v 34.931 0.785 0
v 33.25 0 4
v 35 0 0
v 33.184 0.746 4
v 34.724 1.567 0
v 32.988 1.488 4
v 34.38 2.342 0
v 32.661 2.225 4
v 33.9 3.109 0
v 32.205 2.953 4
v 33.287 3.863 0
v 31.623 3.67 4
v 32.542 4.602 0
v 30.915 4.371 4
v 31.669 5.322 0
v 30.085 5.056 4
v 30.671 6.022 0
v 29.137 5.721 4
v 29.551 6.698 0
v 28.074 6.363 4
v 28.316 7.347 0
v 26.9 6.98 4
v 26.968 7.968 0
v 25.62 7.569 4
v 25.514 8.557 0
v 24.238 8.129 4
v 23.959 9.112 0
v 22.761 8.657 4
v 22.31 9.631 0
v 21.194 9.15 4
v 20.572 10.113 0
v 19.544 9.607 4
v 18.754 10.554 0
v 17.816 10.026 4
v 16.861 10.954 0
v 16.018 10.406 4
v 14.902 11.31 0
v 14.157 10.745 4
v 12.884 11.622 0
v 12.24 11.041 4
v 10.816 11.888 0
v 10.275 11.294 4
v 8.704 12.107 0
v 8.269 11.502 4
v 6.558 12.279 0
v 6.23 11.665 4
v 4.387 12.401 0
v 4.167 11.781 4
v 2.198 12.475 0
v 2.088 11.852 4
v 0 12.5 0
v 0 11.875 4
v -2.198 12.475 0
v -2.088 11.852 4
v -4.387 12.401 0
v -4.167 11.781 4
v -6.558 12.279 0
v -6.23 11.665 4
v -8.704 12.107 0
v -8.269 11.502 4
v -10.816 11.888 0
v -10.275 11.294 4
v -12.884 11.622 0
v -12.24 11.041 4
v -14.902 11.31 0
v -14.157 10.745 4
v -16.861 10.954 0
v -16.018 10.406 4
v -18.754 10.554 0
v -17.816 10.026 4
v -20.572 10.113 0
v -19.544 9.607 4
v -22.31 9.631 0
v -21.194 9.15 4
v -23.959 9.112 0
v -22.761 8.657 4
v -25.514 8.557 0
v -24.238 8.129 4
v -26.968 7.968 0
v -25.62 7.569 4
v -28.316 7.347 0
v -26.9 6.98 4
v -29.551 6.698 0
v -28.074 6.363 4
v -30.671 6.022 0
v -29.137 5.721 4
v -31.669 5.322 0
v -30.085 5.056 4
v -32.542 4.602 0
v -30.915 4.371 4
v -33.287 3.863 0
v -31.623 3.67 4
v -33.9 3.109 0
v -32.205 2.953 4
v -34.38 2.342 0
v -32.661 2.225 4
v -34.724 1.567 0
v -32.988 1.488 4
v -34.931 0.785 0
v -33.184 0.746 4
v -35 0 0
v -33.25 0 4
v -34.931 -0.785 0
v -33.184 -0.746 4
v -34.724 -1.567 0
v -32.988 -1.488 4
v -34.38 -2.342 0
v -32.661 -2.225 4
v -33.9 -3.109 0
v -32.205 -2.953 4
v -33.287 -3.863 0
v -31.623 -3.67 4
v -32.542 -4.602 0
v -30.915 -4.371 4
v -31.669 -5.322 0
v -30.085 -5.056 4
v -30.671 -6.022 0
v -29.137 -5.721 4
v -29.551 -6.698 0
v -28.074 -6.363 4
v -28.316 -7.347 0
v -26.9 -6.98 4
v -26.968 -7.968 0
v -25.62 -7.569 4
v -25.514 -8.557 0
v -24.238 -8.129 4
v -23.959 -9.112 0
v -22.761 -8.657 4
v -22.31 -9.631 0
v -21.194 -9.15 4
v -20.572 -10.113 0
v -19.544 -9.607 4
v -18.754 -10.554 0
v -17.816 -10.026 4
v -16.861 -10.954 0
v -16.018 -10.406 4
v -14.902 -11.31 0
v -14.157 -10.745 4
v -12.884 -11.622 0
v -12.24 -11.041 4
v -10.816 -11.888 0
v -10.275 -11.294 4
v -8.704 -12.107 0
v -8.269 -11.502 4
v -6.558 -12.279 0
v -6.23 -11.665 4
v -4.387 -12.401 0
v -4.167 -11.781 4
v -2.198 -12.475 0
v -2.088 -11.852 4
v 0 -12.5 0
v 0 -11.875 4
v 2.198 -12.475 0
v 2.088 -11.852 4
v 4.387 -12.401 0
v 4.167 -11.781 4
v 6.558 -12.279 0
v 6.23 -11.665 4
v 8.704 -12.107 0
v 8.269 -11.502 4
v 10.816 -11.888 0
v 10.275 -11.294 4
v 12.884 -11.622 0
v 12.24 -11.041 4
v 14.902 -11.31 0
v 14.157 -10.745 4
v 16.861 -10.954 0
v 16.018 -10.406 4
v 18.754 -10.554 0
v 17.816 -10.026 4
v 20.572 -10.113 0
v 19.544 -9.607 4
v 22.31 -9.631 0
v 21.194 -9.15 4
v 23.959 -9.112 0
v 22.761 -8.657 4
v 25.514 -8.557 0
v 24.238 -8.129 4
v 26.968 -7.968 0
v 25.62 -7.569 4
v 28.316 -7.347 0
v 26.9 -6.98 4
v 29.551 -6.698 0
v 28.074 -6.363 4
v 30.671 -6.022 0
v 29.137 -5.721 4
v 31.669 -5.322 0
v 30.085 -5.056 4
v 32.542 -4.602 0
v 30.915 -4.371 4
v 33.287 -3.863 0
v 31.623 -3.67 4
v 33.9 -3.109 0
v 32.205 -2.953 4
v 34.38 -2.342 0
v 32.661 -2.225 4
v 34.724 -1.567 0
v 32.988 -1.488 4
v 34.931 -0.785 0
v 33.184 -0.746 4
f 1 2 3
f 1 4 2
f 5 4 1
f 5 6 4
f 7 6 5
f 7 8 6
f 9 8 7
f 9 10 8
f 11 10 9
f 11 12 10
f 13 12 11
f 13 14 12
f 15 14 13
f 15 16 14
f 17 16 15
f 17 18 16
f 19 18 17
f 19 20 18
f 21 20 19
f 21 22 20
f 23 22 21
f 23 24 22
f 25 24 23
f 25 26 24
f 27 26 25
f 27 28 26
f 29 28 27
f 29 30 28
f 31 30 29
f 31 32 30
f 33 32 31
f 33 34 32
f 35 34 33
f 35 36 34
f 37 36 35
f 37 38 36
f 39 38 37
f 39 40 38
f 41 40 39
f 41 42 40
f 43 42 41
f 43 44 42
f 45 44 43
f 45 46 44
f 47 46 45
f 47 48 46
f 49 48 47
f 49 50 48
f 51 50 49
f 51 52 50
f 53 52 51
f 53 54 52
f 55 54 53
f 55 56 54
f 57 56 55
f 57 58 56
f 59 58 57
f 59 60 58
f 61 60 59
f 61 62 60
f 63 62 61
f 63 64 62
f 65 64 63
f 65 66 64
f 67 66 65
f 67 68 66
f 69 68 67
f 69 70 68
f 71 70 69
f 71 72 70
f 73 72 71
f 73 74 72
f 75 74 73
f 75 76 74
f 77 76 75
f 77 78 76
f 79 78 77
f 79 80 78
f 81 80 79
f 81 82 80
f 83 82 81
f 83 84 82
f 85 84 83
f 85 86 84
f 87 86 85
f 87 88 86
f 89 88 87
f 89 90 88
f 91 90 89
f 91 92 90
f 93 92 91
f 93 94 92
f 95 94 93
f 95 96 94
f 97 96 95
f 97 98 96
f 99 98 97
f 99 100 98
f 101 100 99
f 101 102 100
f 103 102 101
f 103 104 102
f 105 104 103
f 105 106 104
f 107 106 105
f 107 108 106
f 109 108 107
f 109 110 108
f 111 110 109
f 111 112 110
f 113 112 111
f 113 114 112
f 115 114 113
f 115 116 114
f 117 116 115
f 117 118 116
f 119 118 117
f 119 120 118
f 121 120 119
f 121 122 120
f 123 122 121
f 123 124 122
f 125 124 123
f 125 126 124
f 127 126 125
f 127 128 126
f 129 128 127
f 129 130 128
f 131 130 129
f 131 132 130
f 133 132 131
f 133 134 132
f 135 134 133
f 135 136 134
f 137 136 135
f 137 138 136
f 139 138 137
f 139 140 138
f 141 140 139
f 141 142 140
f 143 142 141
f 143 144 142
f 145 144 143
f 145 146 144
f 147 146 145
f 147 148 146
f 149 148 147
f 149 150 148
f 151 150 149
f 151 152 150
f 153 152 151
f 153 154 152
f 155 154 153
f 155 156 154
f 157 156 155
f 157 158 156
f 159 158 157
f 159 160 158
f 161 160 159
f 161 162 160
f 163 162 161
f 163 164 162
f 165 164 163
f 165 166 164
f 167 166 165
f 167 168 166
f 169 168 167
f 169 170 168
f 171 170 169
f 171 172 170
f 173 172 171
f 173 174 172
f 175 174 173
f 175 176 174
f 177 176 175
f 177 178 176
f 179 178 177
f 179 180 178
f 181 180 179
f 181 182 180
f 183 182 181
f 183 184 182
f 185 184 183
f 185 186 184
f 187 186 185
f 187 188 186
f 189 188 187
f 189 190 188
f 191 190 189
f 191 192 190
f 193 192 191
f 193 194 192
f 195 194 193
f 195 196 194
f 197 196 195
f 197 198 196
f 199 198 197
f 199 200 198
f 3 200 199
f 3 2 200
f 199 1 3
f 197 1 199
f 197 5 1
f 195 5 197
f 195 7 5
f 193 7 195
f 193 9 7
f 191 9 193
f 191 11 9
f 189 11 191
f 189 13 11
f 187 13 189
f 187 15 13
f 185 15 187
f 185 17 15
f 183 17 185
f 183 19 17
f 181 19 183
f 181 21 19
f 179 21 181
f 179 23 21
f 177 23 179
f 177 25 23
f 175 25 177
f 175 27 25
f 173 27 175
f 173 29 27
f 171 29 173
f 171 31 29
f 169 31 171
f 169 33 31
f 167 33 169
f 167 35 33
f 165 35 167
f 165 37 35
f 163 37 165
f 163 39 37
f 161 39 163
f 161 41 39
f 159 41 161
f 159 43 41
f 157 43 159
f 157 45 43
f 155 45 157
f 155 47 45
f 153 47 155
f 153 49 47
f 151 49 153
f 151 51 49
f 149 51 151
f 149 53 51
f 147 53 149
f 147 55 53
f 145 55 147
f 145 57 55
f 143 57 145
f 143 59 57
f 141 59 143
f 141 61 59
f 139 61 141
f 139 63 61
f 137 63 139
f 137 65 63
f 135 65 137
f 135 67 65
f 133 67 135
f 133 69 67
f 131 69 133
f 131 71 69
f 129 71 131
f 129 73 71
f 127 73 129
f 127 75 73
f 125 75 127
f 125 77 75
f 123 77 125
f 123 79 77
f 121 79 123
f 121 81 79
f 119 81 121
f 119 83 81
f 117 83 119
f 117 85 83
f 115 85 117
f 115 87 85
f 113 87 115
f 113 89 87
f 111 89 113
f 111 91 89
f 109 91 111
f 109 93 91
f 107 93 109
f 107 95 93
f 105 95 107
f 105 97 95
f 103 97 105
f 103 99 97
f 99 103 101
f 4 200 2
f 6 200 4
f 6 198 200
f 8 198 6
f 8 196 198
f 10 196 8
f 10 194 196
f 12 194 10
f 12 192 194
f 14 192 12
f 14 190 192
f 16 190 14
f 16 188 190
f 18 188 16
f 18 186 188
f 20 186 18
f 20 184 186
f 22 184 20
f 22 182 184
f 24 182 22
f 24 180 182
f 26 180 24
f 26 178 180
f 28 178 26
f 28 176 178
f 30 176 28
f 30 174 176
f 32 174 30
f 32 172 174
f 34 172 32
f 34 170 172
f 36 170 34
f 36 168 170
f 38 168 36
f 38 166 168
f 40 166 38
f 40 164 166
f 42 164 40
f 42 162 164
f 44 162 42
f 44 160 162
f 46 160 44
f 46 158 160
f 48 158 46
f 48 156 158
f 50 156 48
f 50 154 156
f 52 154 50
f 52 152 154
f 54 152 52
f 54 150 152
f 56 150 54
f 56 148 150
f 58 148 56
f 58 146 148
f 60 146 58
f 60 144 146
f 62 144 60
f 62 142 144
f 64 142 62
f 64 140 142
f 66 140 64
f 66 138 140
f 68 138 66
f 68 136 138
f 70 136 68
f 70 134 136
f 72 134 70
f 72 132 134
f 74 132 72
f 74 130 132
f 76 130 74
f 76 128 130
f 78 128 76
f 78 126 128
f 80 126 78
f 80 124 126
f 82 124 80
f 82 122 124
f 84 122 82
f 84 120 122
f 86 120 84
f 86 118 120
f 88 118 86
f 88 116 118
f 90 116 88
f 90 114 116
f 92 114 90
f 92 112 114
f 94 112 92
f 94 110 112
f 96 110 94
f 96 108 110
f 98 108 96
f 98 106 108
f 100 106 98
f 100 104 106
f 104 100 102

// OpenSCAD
// file: build.scad
$build_id = "";

function building(filename) = is_undef(filename) ?
  !is_undef(build)
  : !is_undef(build) && build == filename;

function previewing() = !building();

module build(filename) {
  $build_id = filename;

  if(!is_undef(scad_build_scan) && scad_build_scan == true) {
    echo(str("scad_build_scan: ", filename));
  }
  else if(previewing() || build == filename) {
    children();
  }
}

module preview_row(spacing) {
  if(previewing()) {
    for(x = [0:1:$children - 1]) {
      translate([x * spacing, 0, 0]) {
        children(x);
      }
    }
  }
  else {
    children();
  }
}

module preview_column(spacing) {
  if(previewing()) {
    for(y = [0:1:$children - 1]) {
      translate([0, y * spacing, 0]) {
        children(y);
      }
    }
  }
  else {
    children();
  }
}
// file: minibase.scad
// Based off of titancraft's Customizable Miniature Base (CC0 1.0)
// https://www.thingiverse.com/thing:1112237

include <./build.scad>

$base_rim = 1; //	[1: tapered, 2: inclined, 3: flat]
// Number of sides:
$base_shape = 100; //	[30:Low-res Circle, 100: Hi-res Circle, 5:Pentagon, 6:Hexagon, 8:Octagon, 4:Square, 3:Triangle]

$base_diameter = 32;
$base_height = 4;
$base_slant = 95; // [50:100]

// Percentage:
$base_stretch = 100;

//('Cool' base only)
$base_inner_circle_ratio = 40; // [10:80]

module tapered(r=40) {
  $base_rim = 1;
  $base_inner_circle_ratio = r;

  children();
}

module inclined() {
  $base_rim = 2;

  children();
}

module flat() {
  $base_rim = 3;

  children();
}

module shape(s) {
  $base_shape = s;

  children();
}

module diameter(d) {
  $base_diameter = d;

  children();
}

module height(h) {
  $base_height = h;

  children();
}

module slant(s) {
  $base_slant = s;

  children();
}

module stretch(s) {
  $base_stretch = s;

  children();
}

module base(id) {
  build(id) union() {
    radius = $base_diameter/2;
    scale([$base_stretch/100, 1, 1]){
      if ($base_rim == 1){
        // tapered base
        cyl1_height = $base_height * (1-$base_inner_circle_ratio/100);
        cylinder(cyl1_height, radius, radius * $base_slant/100, $fn=$base_shape);

        cyl2_radius = radius  * $base_slant/100 * .95;
        cyl2_height = $base_height - cyl1_height;

        translate([0, 0, cyl1_height]){
          cylinder(cyl2_height, cyl2_radius, cyl2_radius * $base_slant/100, $fn=$base_shape);
          cylinder(cyl2_height*.5, radius * $base_slant/100, cyl2_radius, $fn=$base_shape);
        }
      } else if ($base_rim == 2){
        // inclined base
        cylinder($base_height, radius, radius * $base_slant/100, $fn=$base_shape);
      } else if ($base_rim == 3){
        // flat base

        cylinder($base_height, radius, radius, $fn=$base_shape);
      }
    }
  }
}
// main file
include <./minibase.scad>

inclined() diameter(25) stretch(280) base("25x70mm-opr-bikes");
